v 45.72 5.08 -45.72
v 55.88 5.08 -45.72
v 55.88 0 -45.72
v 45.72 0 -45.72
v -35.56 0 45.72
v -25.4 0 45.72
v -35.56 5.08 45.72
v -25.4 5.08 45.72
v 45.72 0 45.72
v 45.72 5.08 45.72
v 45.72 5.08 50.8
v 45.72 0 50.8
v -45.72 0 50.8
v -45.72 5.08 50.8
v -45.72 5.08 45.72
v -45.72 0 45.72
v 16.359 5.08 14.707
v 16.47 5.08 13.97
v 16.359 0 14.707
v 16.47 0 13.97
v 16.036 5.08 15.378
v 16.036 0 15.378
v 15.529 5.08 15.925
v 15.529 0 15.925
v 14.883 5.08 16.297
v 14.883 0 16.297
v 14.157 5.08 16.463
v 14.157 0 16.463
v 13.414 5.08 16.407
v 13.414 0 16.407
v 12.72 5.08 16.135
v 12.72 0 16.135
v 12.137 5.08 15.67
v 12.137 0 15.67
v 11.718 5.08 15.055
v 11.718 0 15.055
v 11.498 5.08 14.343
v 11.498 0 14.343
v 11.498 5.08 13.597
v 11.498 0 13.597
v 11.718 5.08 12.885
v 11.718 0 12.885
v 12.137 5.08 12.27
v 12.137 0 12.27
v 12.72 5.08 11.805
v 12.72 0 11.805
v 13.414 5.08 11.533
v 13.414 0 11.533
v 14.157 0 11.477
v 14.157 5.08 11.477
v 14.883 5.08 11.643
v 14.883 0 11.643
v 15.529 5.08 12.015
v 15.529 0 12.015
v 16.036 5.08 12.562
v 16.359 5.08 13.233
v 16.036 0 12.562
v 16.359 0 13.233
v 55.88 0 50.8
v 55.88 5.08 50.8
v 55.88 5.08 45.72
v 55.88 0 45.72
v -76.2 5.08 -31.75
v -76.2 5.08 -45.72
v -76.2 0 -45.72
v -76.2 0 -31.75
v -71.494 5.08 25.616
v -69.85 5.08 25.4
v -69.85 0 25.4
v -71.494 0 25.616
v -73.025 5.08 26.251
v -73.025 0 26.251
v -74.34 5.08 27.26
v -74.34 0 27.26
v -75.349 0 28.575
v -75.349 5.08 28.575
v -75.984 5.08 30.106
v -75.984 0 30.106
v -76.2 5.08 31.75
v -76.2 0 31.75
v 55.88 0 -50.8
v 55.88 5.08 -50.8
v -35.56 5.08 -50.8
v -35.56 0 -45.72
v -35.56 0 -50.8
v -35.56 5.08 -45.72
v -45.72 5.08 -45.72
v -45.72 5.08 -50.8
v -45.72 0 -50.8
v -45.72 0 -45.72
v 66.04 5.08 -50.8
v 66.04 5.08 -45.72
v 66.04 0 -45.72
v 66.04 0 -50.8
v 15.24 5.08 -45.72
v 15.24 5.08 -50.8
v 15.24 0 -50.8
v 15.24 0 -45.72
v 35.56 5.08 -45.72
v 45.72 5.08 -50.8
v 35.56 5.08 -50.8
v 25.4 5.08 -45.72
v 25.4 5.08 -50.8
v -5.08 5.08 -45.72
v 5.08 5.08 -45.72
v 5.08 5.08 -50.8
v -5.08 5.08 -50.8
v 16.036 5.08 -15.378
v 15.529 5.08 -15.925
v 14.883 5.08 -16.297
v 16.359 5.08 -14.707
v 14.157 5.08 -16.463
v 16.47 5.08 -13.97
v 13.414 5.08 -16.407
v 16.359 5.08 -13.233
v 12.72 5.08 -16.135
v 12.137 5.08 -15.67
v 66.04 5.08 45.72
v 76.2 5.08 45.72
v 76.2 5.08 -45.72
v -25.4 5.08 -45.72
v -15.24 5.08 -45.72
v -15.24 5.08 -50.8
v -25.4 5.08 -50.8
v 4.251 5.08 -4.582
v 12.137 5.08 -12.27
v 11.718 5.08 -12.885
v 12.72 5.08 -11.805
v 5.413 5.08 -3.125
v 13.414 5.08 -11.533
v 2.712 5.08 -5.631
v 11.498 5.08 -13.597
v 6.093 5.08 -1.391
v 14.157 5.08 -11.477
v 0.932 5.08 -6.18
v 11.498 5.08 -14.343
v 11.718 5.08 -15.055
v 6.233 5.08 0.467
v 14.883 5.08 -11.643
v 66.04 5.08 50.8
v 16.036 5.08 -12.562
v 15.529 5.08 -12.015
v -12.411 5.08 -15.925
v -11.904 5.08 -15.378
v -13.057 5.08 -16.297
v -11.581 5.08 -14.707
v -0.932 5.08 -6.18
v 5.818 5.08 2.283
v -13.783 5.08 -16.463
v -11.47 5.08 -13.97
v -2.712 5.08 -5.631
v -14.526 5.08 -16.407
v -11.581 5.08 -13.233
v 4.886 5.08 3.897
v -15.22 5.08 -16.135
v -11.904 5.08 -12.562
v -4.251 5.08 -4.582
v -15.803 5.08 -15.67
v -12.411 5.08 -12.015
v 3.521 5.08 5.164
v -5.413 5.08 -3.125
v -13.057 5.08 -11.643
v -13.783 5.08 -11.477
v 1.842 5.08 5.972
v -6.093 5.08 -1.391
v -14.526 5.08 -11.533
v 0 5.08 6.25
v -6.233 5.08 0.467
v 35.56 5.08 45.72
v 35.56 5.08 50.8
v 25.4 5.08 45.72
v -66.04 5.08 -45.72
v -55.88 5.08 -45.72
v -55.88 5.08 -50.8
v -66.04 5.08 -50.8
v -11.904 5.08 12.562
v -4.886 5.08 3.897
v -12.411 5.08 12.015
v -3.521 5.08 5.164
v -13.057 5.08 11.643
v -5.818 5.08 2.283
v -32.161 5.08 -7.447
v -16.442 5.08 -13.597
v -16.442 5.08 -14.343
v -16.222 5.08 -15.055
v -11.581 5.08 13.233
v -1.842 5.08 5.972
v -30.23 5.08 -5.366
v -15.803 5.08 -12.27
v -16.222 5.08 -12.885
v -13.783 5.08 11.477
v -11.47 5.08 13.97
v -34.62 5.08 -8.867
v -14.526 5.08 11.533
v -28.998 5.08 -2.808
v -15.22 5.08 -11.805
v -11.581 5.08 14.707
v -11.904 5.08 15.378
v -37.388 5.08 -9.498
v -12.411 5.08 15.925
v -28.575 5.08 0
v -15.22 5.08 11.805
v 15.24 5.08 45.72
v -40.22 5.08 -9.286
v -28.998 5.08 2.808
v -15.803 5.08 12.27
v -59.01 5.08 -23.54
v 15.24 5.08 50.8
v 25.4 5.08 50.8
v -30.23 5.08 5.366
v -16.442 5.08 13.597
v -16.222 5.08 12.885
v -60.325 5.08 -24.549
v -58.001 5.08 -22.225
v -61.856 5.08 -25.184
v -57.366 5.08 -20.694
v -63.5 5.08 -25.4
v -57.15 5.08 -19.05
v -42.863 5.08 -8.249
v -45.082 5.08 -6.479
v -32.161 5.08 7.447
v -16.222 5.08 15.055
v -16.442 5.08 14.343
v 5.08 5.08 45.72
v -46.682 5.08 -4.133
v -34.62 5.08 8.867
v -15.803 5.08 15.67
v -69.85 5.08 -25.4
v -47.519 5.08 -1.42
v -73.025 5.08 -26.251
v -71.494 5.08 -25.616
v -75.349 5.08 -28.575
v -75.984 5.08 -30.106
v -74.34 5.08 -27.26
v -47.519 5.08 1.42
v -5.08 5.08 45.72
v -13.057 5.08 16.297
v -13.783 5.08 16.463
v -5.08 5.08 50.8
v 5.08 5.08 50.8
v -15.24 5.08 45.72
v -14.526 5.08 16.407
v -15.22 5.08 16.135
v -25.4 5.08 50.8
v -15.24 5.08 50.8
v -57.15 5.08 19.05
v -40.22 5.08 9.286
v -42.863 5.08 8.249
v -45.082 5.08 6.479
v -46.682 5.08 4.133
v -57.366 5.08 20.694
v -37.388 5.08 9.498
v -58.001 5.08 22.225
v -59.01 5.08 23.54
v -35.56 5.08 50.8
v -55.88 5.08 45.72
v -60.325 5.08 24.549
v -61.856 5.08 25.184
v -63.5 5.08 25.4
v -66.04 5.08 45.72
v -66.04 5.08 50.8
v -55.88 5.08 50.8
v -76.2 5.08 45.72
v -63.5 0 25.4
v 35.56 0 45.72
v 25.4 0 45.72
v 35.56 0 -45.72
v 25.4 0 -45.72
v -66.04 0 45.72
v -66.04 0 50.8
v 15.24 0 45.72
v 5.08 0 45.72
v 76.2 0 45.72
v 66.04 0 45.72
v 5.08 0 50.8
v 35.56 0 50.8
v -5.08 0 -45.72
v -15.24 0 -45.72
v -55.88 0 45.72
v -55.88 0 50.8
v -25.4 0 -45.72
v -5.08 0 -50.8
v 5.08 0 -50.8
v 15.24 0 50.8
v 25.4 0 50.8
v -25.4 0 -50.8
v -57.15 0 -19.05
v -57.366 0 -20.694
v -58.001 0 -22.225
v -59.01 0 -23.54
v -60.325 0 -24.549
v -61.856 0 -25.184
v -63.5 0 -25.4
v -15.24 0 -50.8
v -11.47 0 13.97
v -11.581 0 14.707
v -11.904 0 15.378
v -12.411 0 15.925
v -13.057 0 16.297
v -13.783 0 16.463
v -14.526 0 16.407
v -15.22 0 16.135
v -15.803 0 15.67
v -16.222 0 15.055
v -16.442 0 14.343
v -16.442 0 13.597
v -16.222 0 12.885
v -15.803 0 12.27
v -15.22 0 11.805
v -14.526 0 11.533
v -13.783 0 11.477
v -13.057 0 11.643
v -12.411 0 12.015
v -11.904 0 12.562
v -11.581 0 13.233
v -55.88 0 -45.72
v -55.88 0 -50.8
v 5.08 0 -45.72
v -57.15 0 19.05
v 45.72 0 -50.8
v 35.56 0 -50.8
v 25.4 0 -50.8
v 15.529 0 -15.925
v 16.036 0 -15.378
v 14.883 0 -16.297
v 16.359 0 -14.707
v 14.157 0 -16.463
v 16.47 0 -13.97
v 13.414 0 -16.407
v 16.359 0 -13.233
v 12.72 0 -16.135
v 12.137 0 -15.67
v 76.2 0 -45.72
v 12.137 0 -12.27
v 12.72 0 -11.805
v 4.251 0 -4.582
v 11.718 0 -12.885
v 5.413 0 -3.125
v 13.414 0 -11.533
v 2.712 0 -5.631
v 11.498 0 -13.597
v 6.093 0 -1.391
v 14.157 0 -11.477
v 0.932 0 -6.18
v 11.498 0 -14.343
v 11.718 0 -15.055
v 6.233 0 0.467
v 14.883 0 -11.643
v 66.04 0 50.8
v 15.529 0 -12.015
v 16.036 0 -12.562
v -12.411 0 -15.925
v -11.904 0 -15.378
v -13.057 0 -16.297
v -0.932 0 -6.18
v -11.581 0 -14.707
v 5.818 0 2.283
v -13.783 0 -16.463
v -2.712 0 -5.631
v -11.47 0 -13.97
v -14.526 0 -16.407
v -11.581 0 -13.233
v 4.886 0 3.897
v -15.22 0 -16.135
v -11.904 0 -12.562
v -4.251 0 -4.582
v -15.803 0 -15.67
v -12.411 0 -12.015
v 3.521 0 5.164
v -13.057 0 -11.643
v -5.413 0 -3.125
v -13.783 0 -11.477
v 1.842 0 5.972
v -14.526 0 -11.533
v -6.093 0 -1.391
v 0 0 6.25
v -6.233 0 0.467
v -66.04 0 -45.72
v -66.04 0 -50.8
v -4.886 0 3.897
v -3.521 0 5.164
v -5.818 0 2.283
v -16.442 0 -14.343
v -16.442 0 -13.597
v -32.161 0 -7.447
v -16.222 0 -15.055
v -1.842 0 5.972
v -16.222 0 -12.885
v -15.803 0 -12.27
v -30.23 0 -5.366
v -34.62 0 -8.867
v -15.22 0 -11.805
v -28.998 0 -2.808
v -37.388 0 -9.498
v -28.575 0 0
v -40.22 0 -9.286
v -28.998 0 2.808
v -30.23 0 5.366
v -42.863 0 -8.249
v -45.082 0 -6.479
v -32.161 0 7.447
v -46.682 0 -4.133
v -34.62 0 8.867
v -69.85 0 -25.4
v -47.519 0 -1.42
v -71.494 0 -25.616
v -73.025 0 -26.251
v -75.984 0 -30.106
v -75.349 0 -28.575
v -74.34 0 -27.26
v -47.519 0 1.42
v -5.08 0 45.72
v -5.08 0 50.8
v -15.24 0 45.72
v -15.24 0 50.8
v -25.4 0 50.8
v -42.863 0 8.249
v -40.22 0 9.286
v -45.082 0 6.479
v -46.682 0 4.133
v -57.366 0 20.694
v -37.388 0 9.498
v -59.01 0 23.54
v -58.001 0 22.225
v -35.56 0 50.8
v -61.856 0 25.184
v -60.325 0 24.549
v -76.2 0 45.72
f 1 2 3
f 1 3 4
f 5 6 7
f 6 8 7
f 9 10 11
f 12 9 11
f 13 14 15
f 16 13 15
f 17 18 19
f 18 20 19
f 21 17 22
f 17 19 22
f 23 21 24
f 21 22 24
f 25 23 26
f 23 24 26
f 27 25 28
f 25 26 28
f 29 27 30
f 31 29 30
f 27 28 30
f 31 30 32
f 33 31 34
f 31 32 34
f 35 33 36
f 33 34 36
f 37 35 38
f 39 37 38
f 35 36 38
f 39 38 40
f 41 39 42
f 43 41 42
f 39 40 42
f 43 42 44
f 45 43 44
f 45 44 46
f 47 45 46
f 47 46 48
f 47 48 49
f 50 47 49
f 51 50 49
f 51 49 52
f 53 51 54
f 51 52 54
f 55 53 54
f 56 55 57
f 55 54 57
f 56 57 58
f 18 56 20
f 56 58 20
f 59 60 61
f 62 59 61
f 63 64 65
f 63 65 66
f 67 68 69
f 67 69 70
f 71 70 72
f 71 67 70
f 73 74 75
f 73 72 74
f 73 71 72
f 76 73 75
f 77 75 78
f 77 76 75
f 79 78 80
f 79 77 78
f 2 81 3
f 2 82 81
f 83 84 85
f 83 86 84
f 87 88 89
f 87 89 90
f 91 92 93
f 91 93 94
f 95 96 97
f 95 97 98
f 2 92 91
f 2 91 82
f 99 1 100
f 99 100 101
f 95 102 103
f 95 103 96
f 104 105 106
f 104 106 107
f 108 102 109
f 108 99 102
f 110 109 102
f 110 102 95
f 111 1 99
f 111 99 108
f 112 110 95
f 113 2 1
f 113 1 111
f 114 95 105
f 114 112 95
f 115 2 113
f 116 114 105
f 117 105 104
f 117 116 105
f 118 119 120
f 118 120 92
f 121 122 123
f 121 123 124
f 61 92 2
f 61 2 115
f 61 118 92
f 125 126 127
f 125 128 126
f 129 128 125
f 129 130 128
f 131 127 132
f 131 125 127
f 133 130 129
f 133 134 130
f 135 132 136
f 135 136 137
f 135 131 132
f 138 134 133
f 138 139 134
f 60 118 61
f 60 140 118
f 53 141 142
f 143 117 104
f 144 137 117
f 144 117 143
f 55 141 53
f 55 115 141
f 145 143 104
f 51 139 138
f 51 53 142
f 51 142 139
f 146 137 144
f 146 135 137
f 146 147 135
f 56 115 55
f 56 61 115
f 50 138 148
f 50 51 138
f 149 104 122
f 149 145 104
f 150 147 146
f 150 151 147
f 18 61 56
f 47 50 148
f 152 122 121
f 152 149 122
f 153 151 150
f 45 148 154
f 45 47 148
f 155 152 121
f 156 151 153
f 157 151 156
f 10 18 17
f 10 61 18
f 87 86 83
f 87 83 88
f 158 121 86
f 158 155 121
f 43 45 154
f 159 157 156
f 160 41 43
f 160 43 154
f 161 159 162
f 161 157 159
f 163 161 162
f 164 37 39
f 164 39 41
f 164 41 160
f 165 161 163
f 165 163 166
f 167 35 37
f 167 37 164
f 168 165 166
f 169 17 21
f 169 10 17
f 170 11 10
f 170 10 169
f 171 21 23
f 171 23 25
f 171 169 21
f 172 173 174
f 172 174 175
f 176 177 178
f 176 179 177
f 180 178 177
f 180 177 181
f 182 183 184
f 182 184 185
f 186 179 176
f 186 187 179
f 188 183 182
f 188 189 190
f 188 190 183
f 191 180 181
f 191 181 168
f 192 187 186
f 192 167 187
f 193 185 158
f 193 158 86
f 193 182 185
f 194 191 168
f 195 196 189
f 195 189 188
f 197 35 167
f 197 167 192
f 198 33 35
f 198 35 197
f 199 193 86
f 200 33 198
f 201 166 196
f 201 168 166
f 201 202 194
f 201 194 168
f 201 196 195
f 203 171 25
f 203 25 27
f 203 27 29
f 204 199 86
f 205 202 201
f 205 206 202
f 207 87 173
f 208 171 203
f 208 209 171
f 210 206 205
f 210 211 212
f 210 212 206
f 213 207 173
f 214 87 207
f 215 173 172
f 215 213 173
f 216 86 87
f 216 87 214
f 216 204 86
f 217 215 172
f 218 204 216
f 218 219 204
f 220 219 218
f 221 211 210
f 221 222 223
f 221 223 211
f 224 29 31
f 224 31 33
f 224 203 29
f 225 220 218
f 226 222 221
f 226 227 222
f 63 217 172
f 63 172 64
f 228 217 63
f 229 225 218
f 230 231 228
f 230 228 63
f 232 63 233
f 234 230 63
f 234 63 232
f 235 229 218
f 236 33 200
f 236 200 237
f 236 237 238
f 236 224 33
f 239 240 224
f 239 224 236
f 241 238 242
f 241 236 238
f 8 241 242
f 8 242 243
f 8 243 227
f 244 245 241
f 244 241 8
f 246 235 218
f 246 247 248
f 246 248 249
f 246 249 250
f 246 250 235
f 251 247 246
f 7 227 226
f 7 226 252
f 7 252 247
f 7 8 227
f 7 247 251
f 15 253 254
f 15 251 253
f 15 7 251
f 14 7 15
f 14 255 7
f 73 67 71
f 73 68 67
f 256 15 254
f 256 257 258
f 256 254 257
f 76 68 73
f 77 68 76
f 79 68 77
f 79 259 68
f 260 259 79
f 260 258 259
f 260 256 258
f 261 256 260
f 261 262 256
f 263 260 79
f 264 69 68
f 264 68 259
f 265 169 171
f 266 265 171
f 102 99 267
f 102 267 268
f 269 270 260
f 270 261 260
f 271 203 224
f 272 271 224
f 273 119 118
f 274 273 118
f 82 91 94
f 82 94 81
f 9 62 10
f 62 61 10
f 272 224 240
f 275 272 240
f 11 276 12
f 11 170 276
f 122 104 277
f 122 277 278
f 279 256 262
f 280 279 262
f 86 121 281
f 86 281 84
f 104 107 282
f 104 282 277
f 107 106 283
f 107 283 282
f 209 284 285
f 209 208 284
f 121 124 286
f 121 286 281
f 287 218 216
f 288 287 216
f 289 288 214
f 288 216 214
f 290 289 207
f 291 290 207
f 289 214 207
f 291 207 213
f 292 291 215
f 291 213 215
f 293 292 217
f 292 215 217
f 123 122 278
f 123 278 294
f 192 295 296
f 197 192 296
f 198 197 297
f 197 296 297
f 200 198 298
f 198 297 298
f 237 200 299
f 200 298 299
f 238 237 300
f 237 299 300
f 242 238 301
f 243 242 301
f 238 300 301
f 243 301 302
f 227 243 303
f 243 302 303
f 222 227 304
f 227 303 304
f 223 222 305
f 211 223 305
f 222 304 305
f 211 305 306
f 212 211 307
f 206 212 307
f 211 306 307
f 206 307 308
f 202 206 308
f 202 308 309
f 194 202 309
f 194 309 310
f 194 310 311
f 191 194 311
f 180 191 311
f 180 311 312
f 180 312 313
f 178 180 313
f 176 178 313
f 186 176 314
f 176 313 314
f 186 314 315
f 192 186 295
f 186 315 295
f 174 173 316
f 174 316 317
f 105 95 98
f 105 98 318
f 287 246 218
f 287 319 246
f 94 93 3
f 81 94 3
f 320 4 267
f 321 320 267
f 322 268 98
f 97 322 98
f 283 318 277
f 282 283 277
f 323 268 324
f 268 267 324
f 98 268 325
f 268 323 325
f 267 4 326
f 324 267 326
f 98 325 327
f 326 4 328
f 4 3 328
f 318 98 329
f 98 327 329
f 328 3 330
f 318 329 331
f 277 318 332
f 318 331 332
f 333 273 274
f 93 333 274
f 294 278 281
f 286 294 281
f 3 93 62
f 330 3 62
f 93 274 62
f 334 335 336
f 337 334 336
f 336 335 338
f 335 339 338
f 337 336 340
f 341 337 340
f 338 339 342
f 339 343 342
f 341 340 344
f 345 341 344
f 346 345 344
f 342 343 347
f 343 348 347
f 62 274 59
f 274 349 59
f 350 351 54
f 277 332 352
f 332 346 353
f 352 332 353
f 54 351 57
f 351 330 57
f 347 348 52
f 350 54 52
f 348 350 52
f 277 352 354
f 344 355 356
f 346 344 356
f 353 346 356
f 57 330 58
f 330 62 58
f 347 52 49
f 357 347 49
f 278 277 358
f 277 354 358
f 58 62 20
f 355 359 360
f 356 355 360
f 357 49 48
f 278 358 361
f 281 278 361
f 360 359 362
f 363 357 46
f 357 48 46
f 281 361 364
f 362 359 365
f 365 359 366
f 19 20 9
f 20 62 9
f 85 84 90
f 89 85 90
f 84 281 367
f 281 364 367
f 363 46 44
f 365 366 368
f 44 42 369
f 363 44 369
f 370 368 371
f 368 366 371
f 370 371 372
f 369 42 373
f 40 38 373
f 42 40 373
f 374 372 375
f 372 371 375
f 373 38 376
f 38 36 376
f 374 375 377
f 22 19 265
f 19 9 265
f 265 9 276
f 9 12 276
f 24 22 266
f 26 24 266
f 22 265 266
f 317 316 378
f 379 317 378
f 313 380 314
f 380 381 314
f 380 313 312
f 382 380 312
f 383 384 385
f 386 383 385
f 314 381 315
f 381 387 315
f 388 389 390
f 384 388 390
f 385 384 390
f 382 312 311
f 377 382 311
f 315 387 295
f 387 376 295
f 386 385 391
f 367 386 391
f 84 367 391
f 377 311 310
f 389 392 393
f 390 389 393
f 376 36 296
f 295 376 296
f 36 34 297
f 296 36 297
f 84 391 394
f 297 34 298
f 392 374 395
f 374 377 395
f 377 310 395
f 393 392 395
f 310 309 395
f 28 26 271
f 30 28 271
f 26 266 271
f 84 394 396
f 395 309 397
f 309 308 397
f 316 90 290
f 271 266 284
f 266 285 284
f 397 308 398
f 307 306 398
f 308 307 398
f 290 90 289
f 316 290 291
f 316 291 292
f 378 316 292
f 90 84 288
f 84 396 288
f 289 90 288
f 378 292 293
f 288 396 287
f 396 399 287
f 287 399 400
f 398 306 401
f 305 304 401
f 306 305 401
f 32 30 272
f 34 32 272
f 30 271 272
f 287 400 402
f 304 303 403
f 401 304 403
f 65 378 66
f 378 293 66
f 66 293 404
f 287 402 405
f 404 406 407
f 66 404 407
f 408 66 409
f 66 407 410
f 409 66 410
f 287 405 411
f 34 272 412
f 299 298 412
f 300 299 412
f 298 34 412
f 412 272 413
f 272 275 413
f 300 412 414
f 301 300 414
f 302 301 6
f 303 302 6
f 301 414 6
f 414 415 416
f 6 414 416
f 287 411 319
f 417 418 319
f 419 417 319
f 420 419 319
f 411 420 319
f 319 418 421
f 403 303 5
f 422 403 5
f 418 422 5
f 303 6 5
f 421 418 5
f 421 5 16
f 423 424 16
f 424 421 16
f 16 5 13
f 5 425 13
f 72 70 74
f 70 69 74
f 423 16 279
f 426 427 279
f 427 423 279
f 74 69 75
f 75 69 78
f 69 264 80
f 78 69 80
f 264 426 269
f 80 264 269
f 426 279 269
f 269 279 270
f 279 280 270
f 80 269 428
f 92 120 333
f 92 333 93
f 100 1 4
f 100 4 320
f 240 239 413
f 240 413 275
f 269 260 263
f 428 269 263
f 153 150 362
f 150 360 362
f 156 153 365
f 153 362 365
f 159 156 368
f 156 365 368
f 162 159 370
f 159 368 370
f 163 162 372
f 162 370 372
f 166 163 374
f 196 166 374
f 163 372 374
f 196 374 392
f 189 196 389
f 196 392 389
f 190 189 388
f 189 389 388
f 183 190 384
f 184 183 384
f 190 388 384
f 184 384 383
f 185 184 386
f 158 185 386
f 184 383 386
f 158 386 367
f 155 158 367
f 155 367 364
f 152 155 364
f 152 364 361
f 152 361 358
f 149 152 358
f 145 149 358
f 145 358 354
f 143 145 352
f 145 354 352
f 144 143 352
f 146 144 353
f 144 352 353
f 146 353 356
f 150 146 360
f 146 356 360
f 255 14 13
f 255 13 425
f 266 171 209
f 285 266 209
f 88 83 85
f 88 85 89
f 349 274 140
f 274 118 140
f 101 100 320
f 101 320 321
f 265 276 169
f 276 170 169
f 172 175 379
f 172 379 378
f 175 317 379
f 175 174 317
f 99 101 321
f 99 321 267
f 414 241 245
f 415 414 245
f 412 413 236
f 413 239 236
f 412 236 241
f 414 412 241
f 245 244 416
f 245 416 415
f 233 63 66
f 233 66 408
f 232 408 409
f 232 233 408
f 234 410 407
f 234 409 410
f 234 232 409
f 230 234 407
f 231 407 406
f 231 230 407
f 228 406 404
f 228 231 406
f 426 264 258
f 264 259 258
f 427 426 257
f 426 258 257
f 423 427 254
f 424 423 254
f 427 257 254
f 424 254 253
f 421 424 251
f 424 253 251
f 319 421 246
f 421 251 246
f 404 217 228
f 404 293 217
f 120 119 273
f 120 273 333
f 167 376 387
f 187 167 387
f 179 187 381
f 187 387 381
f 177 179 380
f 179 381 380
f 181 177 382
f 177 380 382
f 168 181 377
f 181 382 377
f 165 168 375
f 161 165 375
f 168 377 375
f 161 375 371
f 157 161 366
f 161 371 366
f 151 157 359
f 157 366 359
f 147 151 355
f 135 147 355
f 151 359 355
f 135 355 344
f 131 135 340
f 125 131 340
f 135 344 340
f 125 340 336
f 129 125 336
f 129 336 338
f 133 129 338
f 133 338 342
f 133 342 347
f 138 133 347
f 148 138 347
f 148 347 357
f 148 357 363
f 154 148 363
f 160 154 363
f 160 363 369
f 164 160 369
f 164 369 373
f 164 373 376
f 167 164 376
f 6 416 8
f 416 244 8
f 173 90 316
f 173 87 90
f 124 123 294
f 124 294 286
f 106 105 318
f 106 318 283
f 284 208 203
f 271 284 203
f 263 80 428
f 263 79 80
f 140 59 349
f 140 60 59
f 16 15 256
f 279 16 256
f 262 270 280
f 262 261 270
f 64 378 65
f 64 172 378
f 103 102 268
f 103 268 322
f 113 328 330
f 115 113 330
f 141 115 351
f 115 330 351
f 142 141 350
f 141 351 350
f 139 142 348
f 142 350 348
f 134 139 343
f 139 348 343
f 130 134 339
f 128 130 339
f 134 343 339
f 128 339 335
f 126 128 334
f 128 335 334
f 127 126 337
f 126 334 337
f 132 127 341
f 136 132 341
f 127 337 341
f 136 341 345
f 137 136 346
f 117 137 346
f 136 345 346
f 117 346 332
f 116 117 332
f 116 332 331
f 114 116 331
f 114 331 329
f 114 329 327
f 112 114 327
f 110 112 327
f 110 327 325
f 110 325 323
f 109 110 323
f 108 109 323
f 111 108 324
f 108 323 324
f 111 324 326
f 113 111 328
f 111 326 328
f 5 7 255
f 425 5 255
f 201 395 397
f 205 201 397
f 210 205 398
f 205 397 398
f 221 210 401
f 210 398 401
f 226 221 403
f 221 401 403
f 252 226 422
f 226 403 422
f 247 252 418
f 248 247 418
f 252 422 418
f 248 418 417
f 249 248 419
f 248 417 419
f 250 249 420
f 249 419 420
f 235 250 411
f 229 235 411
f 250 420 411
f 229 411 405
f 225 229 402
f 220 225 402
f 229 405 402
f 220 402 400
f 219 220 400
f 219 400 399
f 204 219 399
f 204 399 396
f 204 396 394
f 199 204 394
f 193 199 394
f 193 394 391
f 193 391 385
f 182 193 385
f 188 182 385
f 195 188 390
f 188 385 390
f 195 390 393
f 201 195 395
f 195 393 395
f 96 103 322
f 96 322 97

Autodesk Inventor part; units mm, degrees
ref_plane "YZ Plane" through (0, 0, 0) normal (1, 0, 0) x (0, 1, 0)
ref_plane "XZ Plane" through (0, 0, 0) normal (0, 1, 0) x (-1, 0, 0)
ref_plane "XY Plane" through (0, 0, 0) normal (0, 0, 1) x (1, 0, 0)
sketch "Sketch1" plane through (0, 0, 0) normal (0, 1, 0) x (-1, 0, 0)
  line L0 (-76.2, 50.8) -> (76.2, 50.8)
  line L1 (76.2, 50.8) -> (76.2, -50.8)
  line L2 (76.2, -50.8) -> (-76.2, -50.8)
  line L3 (-76.2, -50.8) -> (-76.2, 50.8)
  line L4 (-76.2, 50.8) -> (76.2, -50.8) construction
  line L5 (76.2, 50.8) -> (-76.2, -50.8) construction
  point P0 (0, 0)
  dimension "d0" = 152.4
  dimension "d1" = 101.6
extrude "Extrusion1" add sketch "Sketch1" along normal blind 5.08
sketch "Sketch2" plane through (0, 5.08, 0) normal (0, 1, 0) x (1, 0, 0)
  line L0 (-76.2, -50.8) -> (76.2, -50.8) projected
  line L1 (76.2, -50.8) -> (76.2, 50.8) projected
  line L2 (76.2, 50.8) -> (-76.2, 50.8) projected
  line L3 (-76.2, 50.8) -> (-76.2, -50.8) projected
  line L4 (-76.2, -50.8) -> (-66.04, -50.8)
  line L5 (-66.04, -50.8) -> (-66.04, -45.72)
  line L6 (-66.04, -45.72) -> (-76.2, -45.72)
  line L7 (-76.2, -45.72) -> (-76.2, -50.8)
  line L8 (-55.88, -50.8) -> (-45.72, -50.8)
  line L9 (-45.72, -50.8) -> (-45.72, -45.72)
  line L10 (-45.72, -45.72) -> (-55.88, -45.72)
  line L11 (-55.88, -45.72) -> (-55.88, -50.8)
  line L12 (-35.56, -50.8) -> (-25.4, -50.8)
  line L13 (-25.4, -50.8) -> (-25.4, -45.72)
  line L14 (-25.4, -45.72) -> (-35.56, -45.72)
  line L15 (-35.56, -45.72) -> (-35.56, -50.8)
  line L16 (-15.24, -50.8) -> (-5.08, -50.8)
  line L17 (-5.08, -50.8) -> (-5.08, -45.72)
  line L18 (-5.08, -45.72) -> (-15.24, -45.72)
  line L19 (-15.24, -45.72) -> (-15.24, -50.8)
  line L20 (5.08, -50.8) -> (15.24, -50.8)
  line L21 (15.24, -50.8) -> (15.24, -45.72)
  line L22 (15.24, -45.72) -> (5.08, -45.72)
  line L23 (5.08, -45.72) -> (5.08, -50.8)
  line L24 (25.4, -50.8) -> (35.56, -50.8)
  line L25 (35.56, -50.8) -> (35.56, -45.72)
  line L26 (35.56, -45.72) -> (25.4, -45.72)
  line L27 (25.4, -45.72) -> (25.4, -50.8)
  line L28 (45.72, -50.8) -> (55.88, -50.8)
  line L29 (55.88, -50.8) -> (55.88, -45.72)
  line L30 (55.88, -45.72) -> (45.72, -45.72)
  line L31 (45.72, -45.72) -> (45.72, -50.8)
  line L32 (66.04, -50.8) -> (76.2, -50.8)
  line L33 (76.2, -50.8) -> (76.2, -45.72)
  line L34 (76.2, -45.72) -> (66.04, -45.72)
  line L35 (66.04, -45.72) -> (66.04, -50.8)
  line L36 (-76.2, 50.8) -> (-76.2, -50.8) construction
  line L37 (-76.2, 0) -> (76.2, 0) construction
  line L38 (-76.2, 50.8) -> (76.2, 50.8)
  line L39 (-76.2, 50.8) -> (-66.04, 50.8)
  line L40 (-66.04, 50.8) -> (-66.04, 45.72)
  line L41 (-66.04, 45.72) -> (-76.2, 45.72)
  line L42 (-76.2, 45.72) -> (-76.2, 50.8)
  line L43 (-55.88, 50.8) -> (-45.72, 50.8)
  line L44 (-45.72, 50.8) -> (-45.72, 45.72)
  line L45 (-45.72, 45.72) -> (-55.88, 45.72)
  line L46 (-55.88, 45.72) -> (-55.88, 50.8)
  line L47 (-35.56, 50.8) -> (-25.4, 50.8)
  line L48 (-25.4, 50.8) -> (-25.4, 45.72)
  line L49 (-25.4, 45.72) -> (-35.56, 45.72)
  line L50 (-35.56, 45.72) -> (-35.56, 50.8)
  line L51 (-15.24, 50.8) -> (-5.08, 50.8)
  line L52 (-5.08, 50.8) -> (-5.08, 45.72)
  line L53 (-5.08, 45.72) -> (-15.24, 45.72)
  line L54 (-15.24, 45.72) -> (-15.24, 50.8)
  line L55 (5.08, 50.8) -> (15.24, 50.8)
  line L56 (15.24, 50.8) -> (15.24, 45.72)
  line L57 (15.24, 45.72) -> (5.08, 45.72)
  line L58 (5.08, 45.72) -> (5.08, 50.8)
  line L59 (25.4, 50.8) -> (35.56, 50.8)
  line L60 (35.56, 50.8) -> (35.56, 45.72)
  line L61 (35.56, 45.72) -> (25.4, 45.72)
  line L62 (25.4, 45.72) -> (25.4, 50.8)
  line L63 (45.72, 50.8) -> (55.88, 50.8)
  line L64 (55.88, 50.8) -> (55.88, 45.72)
  line L65 (55.88, 45.72) -> (45.72, 45.72)
  line L66 (45.72, 45.72) -> (45.72, 50.8)
  line L67 (66.04, 50.8) -> (76.2, 50.8)
  line L68 (76.2, 50.8) -> (76.2, 45.72)
  line L69 (76.2, 45.72) -> (66.04, 45.72)
  line L70 (66.04, 45.72) -> (66.04, 50.8)
  point P0 (0, 0)
  point P1 (0, 0)
  dimension "d11" = 10.16
  dimension "d12" = 5.08
  dimension "d13" = 0
  dimension "d16" = 20.32
hole "Hole1" at (0, 5.08, 0) direction (0, -1, 0) diameter 12.5 end through all
extrude "Extrusion2" cut sketch "Sketch2" against normal blind 5.08 contours L5 L6 L3 L41 L40 L2 L46 L45 L44 L50 L49 L48 L54 L53 L52 L58 L57 L56 L62 L61 L60 L66 L65 L64 L70 L69 L1 L34 L35 L0 L29 L30 L31 L25 L26 L27 L21 L22 L23 L17 L18 L19 L13 L14 L15 L9 L10 L11 keep common part
sketch "Sketch3" plane through (0, 0, 0) normal (0, -1, 0) x (1, 0, 0)
  circle A0 centre (-38.1, 0) radius 9.525
  line L0 (0, 0) -> (-38.1, 0) construction
  dimension "d23" = 19.05
  dimension "d24" = 38.1
extrude "Extrusion3" cut sketch "Sketch3" against normal blind 25.4
sketch "Sketch4" plane through (0, 0, 0) normal (0, -1, 0) x (1, 0, 0)
  circle A0 centre (13.97, -13.97) radius 2.5
  circle A1 centre (-13.97, -13.97) radius 2.5
  circle A2 centre (-13.97, 13.97) radius 2.5
  circle A3 centre (13.97, 13.97) radius 2.5
  point P0 (0, 0)
extrude "Extrusion4" cut sketch "Sketch4" against normal blind 25.4
sketch "Sketch5" plane through (0, 0, 0) normal (0, -1, 0) x (1, 0, 0)
  circle A0 centre (-13.97, 13.97) radius 2.5 projected
  circle A1 centre (13.97, -13.97) radius 2.5 projected
  circle A2 centre (-13.97, -13.97) radius 2.5 projected
  circle A3 centre (13.97, 13.97) radius 2.5 projected
  circle A4 centre (-38.1, 0) radius 9.525 projected
  circle A5 centre (0, 0) radius 6.25 projected
  line L0 (66.04, -45.72) -> (66.04, -50.8) construction
  line L1 (76.2, -45.72) -> (66.04, -45.72) construction
  line L2 (76.2, -45.72) -> (76.2, 45.72) construction
  line L3 (66.04, 45.72) -> (76.2, 45.72) construction
  line L4 (66.04, 50.8) -> (66.04, 45.72) construction
  line L5 (66.04, 50.8) -> (55.88, 50.8) construction
  line L6 (55.88, 45.72) -> (55.88, 50.8) construction
  line L7 (45.72, 45.72) -> (55.88, 45.72) construction
  line L8 (45.72, 50.8) -> (45.72, 45.72) construction
  line L9 (45.72, 50.8) -> (35.56, 50.8) construction
  line L10 (35.56, 45.72) -> (35.56, 50.8) projected
  line L11 (25.4, 45.72) -> (35.56, 45.72) projected
  line L12 (25.4, 50.8) -> (25.4, 45.72) projected
  line L13 (25.4, 50.8) -> (15.24, 50.8) projected
  line L14 (15.24, 45.72) -> (15.24, 50.8) projected
  line L15 (5.08, 45.72) -> (15.24, 45.72) projected
  line L16 (5.08, 50.8) -> (5.08, 45.72) projected
  line L17 (5.08, 50.8) -> (-5.08, 50.8) projected
  line L18 (-5.08, 45.72) -> (-5.08, 50.8) projected
  line L19 (-15.24, 45.72) -> (-5.08, 45.72) projected
  line L20 (-15.24, 50.8) -> (-15.24, 45.72) projected
  line L21 (-15.24, 50.8) -> (-25.4, 50.8) projected
  line L22 (-25.4, 45.72) -> (-25.4, 50.8) projected
  line L23 (-35.56, 45.72) -> (-25.4, 45.72) projected
  line L24 (-35.56, 50.8) -> (-35.56, 45.72) projected
  line L25 (-35.56, 50.8) -> (-45.72, 50.8) projected
  line L26 (-45.72, 45.72) -> (-45.72, 50.8) projected
  line L27 (-55.88, 45.72) -> (-45.72, 45.72) projected
  line L28 (-55.88, 50.8) -> (-55.88, 45.72) projected
  line L29 (-55.88, 50.8) -> (-66.04, 50.8) projected
  line L30 (-66.04, 45.72) -> (-66.04, 50.8) projected
  line L31 (-76.2, 45.72) -> (-66.04, 45.72) projected
  line L32 (-76.2, 45.72) -> (-76.2, -45.72) projected
  line L33 (-66.04, -45.72) -> (-76.2, -45.72) projected
  line L34 (-66.04, -50.8) -> (-66.04, -45.72) projected
  line L35 (-66.04, -50.8) -> (-55.88, -50.8) projected
  line L36 (-55.88, -45.72) -> (-55.88, -50.8) projected
  line L37 (-45.72, -45.72) -> (-55.88, -45.72) projected
  line L38 (-45.72, -50.8) -> (-45.72, -45.72) projected
  line L39 (-45.72, -50.8) -> (-35.56, -50.8) projected
  line L40 (-35.56, -45.72) -> (-35.56, -50.8) projected
  line L41 (-25.4, -45.72) -> (-35.56, -45.72) projected
  line L42 (-25.4, -50.8) -> (-25.4, -45.72) projected
  line L43 (-25.4, -50.8) -> (-15.24, -50.8) projected
  line L44 (-15.24, -45.72) -> (-15.24, -50.8) projected
  line L45 (-5.08, -45.72) -> (-15.24, -45.72) projected
  line L46 (-5.08, -50.8) -> (-5.08, -45.72) projected
  line L47 (-5.08, -50.8) -> (5.08, -50.8) projected
  line L48 (5.08, -45.72) -> (5.08, -50.8) projected
  line L49 (15.24, -45.72) -> (5.08, -45.72) projected
  line L50 (15.24, -50.8) -> (15.24, -45.72) projected
  line L51 (15.24, -50.8) -> (25.4, -50.8) projected
  line L52 (25.4, -45.72) -> (25.4, -50.8) projected
  line L53 (35.56, -45.72) -> (25.4, -45.72) projected
  line L54 (35.56, -50.8) -> (35.56, -45.72) projected
  line L55 (35.56, -50.8) -> (45.72, -50.8) construction
  line L56 (45.72, -45.72) -> (45.72, -50.8) construction
  line L57 (55.88, -45.72) -> (45.72, -45.72) construction
  line L58 (55.88, -50.8) -> (55.88, -45.72) construction
  line L59 (55.88, -50.8) -> (66.04, -50.8) construction
  line L60 (-76.2, -45.72) -> (-76.2, 45.72) projected
  line L61 (-76.2, 25.4) -> (-57.15, 25.4)
  line L62 (-57.15, 25.4) -> (-57.15, -25.4)
  line L63 (-57.15, -25.4) -> (-76.2, -25.4)
  line L64 (-76.2, -25.4) -> (-76.2, 25.4)
  line L65 (-57.15, 0) -> (-76.2, 0) construction
  line L66 (-76.2, 25.4) -> (-57.15, 25.4)
  line L67 (-57.15, 25.4) -> (-57.15, -25.4)
  line L68 (-57.15, -25.4) -> (-76.2, -25.4)
  line L69 (-76.2, -25.4) -> (-76.2, 25.4)
  dimension "d29" = 50.8
  dimension "d30" = 19.05
extrude "Extrusion5" cut sketch "Sketch5" against normal blind 25.4 contours L61 L62 L63 L32
fillet "Fillet1" radius 6.35 4 edges at (-57.15, 2.54, -25.4) (-76.2, 2.54, -25.4) (-57.15, 2.54, 25.4) (-76.2, 2.54, 25.4)
equation "\"d16\" = 2 * d11"
properties part number "ArmMount" material "Wood (Birch)"
